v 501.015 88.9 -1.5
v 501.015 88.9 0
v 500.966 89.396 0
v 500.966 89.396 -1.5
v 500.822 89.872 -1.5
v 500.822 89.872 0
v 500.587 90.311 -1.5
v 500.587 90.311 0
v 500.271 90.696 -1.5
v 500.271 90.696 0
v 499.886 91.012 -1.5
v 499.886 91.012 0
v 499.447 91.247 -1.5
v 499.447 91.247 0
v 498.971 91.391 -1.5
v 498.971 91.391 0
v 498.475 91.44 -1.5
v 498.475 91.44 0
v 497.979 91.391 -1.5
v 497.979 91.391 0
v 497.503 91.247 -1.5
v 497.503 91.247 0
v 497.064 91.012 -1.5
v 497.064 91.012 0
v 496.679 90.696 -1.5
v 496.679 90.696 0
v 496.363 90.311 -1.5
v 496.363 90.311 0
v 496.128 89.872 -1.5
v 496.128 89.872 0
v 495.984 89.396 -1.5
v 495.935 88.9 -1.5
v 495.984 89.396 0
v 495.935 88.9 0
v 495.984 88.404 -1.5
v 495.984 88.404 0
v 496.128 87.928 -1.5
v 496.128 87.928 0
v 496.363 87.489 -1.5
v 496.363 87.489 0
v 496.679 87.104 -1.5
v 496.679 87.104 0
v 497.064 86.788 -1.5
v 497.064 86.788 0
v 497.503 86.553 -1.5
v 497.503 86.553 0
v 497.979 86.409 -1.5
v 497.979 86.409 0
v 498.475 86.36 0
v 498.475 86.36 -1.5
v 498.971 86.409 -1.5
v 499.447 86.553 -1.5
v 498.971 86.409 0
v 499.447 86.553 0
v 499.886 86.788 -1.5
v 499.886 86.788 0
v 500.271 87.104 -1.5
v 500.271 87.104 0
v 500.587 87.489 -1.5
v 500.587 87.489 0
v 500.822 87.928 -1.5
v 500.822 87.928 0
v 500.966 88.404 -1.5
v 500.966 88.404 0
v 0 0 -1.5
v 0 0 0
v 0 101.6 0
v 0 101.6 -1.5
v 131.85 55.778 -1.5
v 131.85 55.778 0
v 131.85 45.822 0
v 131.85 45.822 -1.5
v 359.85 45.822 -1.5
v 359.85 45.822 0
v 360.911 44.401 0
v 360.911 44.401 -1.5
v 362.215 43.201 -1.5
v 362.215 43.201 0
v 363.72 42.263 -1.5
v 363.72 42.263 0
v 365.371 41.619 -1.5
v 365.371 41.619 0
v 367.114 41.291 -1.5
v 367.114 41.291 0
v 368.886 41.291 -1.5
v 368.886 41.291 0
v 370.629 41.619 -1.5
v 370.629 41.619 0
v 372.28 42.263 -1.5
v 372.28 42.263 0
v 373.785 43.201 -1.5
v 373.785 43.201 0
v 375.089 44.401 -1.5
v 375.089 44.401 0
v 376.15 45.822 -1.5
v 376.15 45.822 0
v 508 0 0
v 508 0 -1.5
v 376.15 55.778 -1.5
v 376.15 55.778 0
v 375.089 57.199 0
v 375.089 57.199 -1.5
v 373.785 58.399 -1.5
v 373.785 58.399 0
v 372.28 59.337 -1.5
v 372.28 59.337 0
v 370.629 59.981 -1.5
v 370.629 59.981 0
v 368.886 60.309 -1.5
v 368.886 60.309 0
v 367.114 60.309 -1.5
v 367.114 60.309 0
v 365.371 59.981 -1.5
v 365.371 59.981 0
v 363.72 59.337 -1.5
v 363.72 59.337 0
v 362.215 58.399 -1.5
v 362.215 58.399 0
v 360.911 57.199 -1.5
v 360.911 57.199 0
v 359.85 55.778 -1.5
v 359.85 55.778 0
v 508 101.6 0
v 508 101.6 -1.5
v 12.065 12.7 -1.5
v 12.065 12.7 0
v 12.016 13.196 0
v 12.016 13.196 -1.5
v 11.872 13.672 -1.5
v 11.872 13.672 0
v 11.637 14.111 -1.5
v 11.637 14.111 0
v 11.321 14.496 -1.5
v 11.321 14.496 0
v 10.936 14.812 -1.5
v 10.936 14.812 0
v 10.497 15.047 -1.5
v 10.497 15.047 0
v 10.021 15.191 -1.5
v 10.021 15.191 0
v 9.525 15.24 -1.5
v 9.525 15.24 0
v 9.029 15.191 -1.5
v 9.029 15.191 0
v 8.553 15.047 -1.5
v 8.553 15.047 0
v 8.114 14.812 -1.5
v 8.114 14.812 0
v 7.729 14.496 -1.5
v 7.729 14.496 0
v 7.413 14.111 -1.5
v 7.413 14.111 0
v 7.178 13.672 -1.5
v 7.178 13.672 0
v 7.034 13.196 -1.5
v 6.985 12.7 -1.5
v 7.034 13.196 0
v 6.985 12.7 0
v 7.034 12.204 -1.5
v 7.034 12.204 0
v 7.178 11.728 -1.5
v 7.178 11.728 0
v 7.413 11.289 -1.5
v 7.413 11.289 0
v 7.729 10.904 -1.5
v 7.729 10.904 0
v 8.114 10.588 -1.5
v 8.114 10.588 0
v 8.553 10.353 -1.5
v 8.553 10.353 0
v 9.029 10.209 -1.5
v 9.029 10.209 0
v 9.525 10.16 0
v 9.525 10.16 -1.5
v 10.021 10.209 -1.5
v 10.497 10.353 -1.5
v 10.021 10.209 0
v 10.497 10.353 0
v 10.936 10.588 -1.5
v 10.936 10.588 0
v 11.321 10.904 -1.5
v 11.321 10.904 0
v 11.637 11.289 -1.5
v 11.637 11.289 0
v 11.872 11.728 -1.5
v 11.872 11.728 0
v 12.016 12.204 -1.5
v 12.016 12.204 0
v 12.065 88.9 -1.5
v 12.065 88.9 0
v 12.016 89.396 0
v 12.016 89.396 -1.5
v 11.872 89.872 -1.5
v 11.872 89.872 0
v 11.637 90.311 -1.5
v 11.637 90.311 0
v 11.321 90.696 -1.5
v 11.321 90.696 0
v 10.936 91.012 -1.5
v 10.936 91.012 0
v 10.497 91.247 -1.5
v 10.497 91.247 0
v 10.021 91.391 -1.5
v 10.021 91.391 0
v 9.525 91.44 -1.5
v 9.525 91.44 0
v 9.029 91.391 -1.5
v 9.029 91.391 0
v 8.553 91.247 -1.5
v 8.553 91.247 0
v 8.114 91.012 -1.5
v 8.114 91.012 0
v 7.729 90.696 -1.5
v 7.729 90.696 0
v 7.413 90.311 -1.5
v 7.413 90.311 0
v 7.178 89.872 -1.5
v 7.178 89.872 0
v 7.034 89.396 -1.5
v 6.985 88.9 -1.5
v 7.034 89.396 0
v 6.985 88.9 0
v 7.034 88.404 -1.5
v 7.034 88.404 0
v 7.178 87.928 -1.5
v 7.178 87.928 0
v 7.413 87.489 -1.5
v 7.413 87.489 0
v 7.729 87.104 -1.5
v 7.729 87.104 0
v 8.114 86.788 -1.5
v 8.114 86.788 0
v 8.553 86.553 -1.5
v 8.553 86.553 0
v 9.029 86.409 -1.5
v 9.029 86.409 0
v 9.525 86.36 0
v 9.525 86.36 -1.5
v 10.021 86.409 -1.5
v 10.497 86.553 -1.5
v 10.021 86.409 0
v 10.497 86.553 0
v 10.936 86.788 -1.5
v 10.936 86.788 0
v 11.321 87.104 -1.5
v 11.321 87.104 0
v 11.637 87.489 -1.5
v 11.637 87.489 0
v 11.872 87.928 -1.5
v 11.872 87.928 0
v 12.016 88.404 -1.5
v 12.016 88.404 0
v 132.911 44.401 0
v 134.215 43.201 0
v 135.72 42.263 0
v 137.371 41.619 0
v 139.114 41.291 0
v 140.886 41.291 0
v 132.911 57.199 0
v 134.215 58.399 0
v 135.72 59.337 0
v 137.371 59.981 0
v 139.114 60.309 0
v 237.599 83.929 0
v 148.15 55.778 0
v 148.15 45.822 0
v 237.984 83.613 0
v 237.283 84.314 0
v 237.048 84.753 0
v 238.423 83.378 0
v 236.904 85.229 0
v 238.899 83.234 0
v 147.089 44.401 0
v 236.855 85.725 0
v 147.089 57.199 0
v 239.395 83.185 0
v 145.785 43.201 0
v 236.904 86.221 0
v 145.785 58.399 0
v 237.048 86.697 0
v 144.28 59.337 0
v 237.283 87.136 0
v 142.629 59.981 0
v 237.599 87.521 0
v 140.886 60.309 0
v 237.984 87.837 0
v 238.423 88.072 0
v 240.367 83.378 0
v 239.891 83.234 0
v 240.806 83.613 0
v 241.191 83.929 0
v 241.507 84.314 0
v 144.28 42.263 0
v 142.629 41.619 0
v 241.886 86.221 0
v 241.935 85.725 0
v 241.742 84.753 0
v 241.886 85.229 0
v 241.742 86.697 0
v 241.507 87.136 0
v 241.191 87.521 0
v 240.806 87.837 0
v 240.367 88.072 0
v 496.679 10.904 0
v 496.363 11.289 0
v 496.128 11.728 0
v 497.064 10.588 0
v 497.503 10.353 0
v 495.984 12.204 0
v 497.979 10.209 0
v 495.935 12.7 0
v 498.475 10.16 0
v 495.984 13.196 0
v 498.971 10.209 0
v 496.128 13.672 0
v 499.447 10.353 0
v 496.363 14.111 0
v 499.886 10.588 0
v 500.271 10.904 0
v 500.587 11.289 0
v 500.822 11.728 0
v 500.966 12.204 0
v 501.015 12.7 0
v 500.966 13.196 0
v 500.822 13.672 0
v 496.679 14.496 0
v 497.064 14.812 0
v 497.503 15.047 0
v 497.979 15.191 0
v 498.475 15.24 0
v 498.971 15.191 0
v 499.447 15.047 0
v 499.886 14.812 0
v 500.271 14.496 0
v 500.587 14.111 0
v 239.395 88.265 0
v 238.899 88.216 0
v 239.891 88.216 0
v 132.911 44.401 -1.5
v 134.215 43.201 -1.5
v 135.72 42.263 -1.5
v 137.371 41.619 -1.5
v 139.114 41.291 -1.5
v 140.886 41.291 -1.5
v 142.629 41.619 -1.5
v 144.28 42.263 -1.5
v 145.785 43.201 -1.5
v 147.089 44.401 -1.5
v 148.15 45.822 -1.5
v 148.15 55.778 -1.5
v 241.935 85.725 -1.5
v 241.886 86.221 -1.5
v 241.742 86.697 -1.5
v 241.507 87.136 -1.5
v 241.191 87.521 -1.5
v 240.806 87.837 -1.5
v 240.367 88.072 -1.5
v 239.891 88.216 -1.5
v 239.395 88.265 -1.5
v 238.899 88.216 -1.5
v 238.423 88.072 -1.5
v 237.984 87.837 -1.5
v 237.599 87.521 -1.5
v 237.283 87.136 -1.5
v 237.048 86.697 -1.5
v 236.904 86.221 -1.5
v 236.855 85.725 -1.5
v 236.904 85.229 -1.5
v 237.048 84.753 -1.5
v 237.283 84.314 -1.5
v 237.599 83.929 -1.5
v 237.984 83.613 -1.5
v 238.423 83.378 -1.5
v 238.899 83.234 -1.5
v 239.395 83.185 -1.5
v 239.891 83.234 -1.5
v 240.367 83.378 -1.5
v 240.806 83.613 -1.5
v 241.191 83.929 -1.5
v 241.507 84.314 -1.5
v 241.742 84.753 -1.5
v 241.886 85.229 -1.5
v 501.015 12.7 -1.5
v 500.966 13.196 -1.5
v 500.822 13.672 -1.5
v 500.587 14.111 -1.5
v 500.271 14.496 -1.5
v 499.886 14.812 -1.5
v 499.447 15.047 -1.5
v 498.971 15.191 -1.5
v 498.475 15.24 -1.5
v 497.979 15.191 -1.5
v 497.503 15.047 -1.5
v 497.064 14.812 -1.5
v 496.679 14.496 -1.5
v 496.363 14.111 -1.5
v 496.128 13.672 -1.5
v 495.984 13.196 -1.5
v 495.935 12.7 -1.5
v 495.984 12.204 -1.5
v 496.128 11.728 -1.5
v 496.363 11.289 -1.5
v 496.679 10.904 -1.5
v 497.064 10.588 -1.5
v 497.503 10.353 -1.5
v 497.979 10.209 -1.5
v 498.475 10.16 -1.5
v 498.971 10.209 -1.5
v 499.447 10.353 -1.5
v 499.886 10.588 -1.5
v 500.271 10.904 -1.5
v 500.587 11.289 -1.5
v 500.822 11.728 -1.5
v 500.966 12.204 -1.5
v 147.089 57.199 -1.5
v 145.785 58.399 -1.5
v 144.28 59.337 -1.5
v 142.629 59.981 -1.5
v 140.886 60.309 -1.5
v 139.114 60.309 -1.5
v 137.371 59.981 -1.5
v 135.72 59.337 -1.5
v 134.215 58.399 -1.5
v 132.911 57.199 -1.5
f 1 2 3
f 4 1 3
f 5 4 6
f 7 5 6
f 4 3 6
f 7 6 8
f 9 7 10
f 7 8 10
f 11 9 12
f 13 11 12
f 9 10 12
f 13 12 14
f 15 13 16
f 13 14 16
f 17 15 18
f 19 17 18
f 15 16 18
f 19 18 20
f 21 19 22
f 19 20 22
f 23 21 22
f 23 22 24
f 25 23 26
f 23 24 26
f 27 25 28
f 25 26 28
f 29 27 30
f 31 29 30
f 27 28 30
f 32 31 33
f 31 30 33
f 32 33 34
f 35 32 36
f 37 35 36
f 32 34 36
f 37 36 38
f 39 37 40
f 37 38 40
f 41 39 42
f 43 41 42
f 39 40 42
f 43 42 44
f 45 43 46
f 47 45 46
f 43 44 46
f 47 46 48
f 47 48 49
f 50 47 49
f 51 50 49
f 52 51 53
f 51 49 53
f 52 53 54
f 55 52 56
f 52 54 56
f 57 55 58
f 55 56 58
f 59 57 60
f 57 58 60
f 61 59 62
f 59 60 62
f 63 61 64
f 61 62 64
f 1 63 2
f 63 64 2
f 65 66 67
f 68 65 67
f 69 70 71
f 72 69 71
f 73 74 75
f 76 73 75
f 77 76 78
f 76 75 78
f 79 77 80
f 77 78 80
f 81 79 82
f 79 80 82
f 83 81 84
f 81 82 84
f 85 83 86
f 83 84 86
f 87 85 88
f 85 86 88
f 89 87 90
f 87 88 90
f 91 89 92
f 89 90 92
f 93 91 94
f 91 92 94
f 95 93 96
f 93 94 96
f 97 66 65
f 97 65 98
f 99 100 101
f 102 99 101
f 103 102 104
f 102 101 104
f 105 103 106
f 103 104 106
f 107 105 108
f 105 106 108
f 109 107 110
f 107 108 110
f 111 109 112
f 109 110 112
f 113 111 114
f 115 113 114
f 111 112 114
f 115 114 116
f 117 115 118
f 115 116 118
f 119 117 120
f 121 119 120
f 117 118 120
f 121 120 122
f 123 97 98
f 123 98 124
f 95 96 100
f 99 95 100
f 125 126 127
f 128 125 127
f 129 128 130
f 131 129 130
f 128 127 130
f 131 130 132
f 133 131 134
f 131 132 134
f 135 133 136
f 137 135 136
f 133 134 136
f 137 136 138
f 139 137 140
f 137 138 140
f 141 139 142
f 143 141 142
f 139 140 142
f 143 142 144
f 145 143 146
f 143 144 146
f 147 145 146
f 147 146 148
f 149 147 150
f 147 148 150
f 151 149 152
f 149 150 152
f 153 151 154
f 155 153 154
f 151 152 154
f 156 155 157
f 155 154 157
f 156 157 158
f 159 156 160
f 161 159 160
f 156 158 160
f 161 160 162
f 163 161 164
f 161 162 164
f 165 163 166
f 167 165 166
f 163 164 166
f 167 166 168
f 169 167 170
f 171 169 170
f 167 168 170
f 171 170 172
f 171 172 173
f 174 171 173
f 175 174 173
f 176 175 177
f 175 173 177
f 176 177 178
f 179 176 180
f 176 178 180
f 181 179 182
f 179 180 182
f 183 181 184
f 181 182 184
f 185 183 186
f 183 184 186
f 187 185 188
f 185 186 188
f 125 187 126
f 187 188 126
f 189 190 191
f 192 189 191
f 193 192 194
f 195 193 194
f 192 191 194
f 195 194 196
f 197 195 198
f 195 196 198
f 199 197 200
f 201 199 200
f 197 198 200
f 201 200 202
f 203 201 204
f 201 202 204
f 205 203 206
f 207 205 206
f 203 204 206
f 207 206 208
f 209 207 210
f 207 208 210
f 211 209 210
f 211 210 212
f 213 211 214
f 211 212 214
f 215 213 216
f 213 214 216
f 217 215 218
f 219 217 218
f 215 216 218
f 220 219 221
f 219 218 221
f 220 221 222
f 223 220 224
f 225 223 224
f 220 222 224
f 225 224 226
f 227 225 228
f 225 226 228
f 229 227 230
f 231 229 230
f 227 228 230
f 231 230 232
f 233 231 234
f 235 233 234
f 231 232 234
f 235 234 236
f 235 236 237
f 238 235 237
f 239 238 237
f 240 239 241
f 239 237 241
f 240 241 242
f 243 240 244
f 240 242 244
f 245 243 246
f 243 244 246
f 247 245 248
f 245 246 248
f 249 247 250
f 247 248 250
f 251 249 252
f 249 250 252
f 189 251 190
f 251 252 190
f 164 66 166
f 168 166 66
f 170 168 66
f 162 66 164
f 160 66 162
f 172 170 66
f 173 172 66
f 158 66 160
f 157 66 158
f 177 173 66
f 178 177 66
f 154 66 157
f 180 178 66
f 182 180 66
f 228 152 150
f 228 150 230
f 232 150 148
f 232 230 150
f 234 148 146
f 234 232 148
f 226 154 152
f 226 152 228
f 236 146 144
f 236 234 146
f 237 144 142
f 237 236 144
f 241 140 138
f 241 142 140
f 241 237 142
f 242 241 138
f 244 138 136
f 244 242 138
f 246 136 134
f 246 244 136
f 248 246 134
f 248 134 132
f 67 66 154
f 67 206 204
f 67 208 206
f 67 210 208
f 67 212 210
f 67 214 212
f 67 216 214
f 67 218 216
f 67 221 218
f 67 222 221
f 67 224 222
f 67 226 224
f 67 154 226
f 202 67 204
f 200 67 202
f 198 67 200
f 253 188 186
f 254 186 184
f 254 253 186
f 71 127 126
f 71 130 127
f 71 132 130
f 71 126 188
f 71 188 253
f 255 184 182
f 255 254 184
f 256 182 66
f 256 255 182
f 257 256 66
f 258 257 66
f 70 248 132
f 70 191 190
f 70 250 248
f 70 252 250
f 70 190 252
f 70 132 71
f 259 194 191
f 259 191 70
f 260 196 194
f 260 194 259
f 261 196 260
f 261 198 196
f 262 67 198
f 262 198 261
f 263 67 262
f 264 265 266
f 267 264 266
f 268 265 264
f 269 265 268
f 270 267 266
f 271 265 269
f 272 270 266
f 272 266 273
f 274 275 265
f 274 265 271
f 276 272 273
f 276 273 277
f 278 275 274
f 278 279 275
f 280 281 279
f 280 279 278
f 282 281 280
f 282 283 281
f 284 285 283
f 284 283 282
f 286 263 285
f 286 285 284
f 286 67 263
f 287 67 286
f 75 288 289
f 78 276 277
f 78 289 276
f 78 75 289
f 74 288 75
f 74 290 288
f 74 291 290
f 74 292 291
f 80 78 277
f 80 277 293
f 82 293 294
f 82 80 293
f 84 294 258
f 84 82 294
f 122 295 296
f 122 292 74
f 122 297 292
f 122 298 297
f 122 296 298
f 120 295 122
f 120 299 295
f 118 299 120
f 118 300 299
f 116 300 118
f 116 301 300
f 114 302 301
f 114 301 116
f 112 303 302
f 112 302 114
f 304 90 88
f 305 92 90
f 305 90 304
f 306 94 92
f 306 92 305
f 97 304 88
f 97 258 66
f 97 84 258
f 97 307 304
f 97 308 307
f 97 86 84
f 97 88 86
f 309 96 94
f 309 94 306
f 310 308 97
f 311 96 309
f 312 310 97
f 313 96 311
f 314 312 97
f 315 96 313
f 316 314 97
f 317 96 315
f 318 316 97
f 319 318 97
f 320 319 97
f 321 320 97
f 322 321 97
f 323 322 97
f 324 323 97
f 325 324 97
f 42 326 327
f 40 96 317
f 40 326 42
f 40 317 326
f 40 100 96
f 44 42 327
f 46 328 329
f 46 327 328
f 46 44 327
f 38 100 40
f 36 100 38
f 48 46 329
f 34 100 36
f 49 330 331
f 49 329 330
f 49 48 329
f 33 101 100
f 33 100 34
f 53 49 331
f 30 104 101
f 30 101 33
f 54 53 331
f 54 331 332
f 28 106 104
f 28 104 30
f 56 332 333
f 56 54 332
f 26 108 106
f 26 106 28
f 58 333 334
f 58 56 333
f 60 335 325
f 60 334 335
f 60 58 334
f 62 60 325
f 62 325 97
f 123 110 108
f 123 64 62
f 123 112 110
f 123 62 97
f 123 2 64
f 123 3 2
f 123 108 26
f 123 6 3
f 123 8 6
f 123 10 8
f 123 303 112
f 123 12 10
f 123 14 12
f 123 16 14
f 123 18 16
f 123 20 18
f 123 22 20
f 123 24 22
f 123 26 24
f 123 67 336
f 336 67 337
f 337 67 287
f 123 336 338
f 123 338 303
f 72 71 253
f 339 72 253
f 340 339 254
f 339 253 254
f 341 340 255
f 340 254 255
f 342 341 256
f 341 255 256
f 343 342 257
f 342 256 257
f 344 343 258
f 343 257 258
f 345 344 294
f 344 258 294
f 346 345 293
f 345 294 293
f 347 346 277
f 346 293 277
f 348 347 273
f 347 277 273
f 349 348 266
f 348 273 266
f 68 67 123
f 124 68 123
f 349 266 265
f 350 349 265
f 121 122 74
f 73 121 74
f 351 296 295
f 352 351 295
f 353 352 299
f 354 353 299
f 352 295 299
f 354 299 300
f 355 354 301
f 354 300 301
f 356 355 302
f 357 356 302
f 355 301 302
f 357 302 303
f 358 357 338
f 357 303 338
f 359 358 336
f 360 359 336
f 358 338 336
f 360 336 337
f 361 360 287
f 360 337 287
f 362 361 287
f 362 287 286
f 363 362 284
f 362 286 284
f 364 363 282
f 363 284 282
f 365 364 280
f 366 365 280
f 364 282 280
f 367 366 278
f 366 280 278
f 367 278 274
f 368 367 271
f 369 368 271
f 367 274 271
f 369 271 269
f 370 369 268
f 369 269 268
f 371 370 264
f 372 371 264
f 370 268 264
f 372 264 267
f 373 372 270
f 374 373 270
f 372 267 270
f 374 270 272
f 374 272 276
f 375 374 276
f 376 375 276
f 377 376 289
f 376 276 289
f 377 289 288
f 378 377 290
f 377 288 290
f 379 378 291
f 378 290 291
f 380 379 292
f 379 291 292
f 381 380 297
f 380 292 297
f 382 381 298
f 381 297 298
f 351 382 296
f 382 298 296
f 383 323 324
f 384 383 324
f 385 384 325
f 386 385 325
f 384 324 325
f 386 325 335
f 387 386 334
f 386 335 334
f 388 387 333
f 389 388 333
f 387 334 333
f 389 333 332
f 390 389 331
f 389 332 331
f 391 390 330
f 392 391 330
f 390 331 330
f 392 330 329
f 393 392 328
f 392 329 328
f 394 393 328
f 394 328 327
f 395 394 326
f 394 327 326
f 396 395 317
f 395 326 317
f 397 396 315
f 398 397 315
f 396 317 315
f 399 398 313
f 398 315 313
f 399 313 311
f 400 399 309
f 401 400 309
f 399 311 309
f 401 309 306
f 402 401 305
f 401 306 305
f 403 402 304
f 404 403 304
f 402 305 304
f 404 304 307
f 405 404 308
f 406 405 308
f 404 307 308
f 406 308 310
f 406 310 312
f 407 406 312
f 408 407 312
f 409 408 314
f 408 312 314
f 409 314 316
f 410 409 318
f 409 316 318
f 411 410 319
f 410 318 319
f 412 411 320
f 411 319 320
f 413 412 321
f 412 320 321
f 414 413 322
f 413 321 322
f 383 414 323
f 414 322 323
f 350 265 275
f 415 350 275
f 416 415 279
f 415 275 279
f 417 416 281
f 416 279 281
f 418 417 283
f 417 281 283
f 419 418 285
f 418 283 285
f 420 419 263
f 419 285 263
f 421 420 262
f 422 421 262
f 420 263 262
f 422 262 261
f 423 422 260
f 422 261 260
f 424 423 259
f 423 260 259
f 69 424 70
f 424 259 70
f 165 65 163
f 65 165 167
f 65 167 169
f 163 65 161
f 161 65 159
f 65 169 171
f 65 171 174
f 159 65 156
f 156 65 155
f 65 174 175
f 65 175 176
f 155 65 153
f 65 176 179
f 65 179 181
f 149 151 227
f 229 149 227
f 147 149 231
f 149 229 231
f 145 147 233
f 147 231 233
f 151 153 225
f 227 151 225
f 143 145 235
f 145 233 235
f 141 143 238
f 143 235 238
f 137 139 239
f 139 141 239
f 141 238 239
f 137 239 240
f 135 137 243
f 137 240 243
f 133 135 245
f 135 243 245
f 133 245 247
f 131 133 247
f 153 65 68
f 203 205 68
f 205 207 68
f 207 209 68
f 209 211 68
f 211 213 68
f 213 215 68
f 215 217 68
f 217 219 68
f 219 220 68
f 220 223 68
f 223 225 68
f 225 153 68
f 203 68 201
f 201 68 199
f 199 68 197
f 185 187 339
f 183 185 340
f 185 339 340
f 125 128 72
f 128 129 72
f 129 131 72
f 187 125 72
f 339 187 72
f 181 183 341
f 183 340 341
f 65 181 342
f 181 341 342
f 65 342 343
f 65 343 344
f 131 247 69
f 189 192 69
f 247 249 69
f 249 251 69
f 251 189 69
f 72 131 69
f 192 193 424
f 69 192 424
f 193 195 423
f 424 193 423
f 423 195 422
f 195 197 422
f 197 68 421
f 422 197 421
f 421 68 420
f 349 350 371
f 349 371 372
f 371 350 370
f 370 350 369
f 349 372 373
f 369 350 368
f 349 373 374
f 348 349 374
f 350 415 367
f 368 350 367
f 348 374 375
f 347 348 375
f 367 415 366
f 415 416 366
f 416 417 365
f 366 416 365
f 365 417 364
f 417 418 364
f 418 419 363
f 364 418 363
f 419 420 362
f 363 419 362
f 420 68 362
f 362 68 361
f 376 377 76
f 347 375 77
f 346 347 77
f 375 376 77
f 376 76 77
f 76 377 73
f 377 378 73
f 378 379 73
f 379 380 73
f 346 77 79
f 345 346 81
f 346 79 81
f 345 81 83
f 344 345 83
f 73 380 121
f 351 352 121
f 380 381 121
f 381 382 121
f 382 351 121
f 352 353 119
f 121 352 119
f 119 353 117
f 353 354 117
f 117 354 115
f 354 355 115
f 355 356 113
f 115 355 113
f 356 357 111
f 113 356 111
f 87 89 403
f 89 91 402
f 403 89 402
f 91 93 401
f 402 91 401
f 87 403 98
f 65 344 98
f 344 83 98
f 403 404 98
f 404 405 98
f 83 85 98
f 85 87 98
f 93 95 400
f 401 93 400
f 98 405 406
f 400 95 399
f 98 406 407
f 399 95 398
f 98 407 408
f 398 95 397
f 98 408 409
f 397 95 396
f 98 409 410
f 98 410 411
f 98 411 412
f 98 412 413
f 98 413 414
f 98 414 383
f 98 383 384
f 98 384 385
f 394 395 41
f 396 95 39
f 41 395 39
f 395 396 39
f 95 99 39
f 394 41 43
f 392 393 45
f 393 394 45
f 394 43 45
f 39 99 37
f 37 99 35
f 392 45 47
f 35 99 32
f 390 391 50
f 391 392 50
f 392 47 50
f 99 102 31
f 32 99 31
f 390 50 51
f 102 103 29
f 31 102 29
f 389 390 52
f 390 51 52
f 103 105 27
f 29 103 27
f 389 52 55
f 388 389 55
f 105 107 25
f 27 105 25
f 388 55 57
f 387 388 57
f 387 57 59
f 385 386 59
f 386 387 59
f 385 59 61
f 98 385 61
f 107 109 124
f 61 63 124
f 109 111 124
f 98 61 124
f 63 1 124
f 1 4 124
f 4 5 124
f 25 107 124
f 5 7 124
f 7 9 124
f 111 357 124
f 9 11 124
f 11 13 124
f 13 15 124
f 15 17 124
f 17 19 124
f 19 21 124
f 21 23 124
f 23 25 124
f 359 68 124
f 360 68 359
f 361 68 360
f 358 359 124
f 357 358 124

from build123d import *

# Parameters (mm, degrees)
F0_W     = 508
F0_H     = 101.6
F0_R     = 2.54
F1_DEPTH = 1.5
F3_DEPTH = 25


with BuildPart() as f1:
    # F0 (on Top) → F1 (new body)
    with BuildSketch(Plane.XY):
        with Locations((254, 50.8)):
            Rectangle(F0_W, F0_H)
        with Locations((9.525, 12.7)):
            Circle(F0_R, mode=Mode.SUBTRACT)
        with Locations((498.475, 12.7)):
            Circle(F0_R, mode=Mode.SUBTRACT)
        with Locations((9.525, 88.9)):
            Circle(F0_R, mode=Mode.SUBTRACT)
        with Locations((239.395, 85.725)):
            Circle(F0_R, mode=Mode.SUBTRACT)
        with Locations((498.475, 88.9)):
            Circle(F0_R, mode=Mode.SUBTRACT)
    extrude(amount=-F1_DEPTH)

    # F2 (on Top) → F3 (cut)
    with BuildSketch(Plane.XY):
        with BuildLine():
            Line((148.15, 45.822049), (148.15, 55.777951))
            ThreePointArc((148.15, 55.777951), (140, 60.35), (131.85, 55.777951))
            Line((131.85, 55.777951), (131.85, 45.822049))
            ThreePointArc((131.85, 45.822049), (140, 41.25), (148.15, 45.822049))
        make_face()
        with BuildLine():
            Line((376.15, 45.822049), (376.15, 55.777951))
            ThreePointArc((376.15, 55.777951), (368, 60.35), (359.85, 55.777951))
            Line((359.85, 55.777951), (359.85, 45.822049))
            ThreePointArc((359.85, 45.822049), (368, 41.25), (376.15, 45.822049))
        make_face()
    extrude(amount=-F3_DEPTH, mode=Mode.SUBTRACT)


solid = f1.part
